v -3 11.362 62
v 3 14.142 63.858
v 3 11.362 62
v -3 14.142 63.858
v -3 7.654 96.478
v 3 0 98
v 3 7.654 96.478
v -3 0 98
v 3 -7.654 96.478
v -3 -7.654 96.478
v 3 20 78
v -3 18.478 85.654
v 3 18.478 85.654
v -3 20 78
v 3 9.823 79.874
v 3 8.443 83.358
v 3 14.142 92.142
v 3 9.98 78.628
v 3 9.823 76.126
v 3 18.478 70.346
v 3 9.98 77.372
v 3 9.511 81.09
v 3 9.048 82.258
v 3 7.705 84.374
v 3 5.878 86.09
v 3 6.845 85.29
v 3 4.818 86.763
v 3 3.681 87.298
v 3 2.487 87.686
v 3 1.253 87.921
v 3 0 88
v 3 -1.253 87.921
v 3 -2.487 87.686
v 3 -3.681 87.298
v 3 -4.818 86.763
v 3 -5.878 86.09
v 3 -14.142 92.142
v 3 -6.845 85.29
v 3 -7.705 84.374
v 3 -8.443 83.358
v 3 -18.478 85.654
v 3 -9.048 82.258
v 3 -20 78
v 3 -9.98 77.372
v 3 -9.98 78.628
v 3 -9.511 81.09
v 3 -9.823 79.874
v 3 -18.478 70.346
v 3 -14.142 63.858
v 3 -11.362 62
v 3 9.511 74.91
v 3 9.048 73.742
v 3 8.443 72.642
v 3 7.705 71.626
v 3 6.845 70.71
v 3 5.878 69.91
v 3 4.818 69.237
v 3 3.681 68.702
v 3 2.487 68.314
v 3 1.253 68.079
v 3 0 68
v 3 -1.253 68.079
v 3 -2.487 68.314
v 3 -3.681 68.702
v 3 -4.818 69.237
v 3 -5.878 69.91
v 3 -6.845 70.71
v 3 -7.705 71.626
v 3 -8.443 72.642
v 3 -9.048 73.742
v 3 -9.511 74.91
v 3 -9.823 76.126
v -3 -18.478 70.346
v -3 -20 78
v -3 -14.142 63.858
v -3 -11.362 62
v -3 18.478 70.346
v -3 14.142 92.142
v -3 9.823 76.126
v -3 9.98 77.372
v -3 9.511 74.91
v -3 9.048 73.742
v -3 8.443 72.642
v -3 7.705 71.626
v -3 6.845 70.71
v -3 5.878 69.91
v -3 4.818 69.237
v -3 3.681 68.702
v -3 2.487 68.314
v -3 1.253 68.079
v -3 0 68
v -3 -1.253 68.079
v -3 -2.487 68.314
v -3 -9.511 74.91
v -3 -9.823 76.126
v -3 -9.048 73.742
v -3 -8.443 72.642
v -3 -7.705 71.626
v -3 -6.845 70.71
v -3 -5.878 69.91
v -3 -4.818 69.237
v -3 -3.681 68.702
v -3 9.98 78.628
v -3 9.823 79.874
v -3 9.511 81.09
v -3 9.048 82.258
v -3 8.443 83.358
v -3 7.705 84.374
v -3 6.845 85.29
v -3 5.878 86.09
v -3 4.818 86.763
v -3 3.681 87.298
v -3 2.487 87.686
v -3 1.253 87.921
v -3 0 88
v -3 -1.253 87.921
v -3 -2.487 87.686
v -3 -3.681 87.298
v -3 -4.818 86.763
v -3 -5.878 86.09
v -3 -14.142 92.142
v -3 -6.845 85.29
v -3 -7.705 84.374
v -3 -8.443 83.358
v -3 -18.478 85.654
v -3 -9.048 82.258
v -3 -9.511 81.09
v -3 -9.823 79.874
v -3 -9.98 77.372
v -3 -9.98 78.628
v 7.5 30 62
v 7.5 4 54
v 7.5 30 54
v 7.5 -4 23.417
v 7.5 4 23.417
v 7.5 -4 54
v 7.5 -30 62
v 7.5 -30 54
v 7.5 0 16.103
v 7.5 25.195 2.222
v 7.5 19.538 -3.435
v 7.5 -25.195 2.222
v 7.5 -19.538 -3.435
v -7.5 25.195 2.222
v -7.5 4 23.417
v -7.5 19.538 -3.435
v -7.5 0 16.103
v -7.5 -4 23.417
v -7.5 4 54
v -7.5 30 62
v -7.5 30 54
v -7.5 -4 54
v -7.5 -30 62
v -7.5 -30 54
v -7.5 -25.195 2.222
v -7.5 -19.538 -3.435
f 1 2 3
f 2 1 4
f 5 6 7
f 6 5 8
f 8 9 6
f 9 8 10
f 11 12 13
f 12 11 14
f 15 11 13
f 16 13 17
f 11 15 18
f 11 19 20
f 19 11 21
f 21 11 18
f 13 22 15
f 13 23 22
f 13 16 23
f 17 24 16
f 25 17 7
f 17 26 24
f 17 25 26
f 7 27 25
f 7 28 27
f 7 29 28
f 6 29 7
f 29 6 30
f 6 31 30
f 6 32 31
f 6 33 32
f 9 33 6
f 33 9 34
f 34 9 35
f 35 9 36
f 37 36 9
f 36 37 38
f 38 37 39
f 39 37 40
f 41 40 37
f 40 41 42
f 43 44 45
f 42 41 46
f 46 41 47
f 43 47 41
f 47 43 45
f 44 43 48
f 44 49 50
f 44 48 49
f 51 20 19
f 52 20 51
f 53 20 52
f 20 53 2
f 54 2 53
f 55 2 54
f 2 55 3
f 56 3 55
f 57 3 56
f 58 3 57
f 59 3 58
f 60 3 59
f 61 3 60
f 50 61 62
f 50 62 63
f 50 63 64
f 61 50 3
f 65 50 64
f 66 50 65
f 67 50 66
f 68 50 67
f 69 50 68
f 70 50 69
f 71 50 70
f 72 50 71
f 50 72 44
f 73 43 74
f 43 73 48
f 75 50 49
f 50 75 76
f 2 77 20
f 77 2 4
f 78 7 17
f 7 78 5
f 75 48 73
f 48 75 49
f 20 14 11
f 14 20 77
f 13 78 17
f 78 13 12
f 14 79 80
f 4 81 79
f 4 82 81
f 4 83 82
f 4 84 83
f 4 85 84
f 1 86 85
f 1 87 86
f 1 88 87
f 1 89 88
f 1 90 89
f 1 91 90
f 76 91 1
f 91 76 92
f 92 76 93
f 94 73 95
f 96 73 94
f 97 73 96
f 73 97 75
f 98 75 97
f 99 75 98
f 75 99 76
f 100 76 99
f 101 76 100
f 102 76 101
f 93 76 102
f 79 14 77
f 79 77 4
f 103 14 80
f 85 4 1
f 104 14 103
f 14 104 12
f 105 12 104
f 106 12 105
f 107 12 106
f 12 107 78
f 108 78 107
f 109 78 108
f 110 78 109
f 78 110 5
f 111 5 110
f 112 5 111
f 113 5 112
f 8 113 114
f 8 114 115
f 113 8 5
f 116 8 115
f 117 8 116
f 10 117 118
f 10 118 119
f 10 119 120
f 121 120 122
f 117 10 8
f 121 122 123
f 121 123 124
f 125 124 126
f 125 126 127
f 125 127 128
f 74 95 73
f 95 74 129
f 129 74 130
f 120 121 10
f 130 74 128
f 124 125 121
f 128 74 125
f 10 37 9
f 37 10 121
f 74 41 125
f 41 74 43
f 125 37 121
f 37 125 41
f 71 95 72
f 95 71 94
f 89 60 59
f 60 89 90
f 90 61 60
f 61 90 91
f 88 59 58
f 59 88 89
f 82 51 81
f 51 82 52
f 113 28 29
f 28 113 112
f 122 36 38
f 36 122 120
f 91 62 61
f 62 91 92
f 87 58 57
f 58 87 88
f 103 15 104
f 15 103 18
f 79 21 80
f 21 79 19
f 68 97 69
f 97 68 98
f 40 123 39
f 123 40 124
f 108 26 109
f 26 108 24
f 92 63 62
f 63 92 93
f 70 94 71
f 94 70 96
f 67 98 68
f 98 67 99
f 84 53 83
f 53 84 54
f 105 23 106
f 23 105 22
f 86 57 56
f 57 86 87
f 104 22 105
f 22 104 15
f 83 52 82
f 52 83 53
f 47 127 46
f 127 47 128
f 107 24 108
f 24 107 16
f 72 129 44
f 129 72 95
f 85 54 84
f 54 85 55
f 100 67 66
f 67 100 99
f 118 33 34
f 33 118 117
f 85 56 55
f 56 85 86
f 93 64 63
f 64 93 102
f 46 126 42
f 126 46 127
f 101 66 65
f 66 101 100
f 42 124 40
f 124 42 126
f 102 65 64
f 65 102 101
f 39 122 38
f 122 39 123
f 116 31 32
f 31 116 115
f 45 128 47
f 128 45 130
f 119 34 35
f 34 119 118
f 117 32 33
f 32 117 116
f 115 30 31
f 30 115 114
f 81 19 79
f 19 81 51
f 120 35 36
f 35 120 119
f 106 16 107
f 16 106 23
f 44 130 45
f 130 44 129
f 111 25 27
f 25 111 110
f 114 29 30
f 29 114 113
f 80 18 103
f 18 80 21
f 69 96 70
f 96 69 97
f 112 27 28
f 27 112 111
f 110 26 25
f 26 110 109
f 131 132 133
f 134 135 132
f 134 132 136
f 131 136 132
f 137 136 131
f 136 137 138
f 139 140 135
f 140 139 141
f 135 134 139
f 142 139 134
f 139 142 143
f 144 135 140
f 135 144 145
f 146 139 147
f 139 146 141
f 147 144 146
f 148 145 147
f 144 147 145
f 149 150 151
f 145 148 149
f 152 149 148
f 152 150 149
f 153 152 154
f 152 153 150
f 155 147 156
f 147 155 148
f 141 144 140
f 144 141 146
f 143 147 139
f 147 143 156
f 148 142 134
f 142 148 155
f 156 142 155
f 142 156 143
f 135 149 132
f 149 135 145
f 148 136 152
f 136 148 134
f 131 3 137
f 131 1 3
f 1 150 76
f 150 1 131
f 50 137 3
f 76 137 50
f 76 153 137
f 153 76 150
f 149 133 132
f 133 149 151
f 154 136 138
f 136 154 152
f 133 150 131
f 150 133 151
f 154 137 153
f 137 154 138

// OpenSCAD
width = 15;
depth = 7.5;
thickness = 2;
height = 10;
head = 5;

scale([2, 4, 4]) {
translate([0, 0, 4.5]){
union() {
    translate([0, width / 4 -.81, -2]) {
        rotate([-45, 0, 0]) {
            cube([depth, width / 2, thickness], true);
        }
    }
    translate([0, -width / 4 + .81, -2]) {
        rotate([45, 0, 0]) {
            cube([depth, width / 2, thickness], true);
        }
    }
    translate([0, 0, height / 2]) {
        cube([depth, thickness, height], true);
    }
    translate([0, 0, height]) {
        cube([depth, width, thickness], true);
    }
    translate([0, 0, height + head]) {
        rotate([0, 90, 0]) {
            difference() {
                cylinder(thickness * 1.5, head, head, true);
                cylinder($fn=50, thickness * 1.5, head / 2, head / 2, true);
            }
        }
    }
}
}
}
